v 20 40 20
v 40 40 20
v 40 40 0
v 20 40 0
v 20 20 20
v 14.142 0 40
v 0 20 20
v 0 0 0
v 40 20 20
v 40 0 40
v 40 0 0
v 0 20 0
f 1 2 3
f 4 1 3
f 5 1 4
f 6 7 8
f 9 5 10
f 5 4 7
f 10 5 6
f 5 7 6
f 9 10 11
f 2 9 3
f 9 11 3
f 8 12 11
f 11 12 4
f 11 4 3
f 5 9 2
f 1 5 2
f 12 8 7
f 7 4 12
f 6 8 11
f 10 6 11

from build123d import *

# Parameters (mm, degrees)
SKETCH1_W           = 40
SKETCH1_H           = 40
BOSS_EXTRUDE1_DEPTH = 40
CUT_EXTRUDE1_DEPTH  = 40
CUT_EXTRUDE2_DEPTH  = 40
CUT_EXTRUDE3_DEPTH  = 40
SKETCH5_W           = 20
SKETCH5_H           = 40
BOSS_EXTRUDE2_DEPTH = 20


with BuildPart() as part:
    # Sketch1 → Boss-Extrude1 (new body)
    with BuildSketch(Plane.XY):
        with Locations((20, 20)):
            Rectangle(SKETCH1_W, SKETCH1_H)
    extrude(amount=BOSS_EXTRUDE1_DEPTH)

    # Sketch2 → Cut-Extrude1 (cut)
    with BuildSketch(Plane.XY.offset(40)):
        Polygon((0, 20), (0, 40), (20, 40), align=None)
    extrude(amount=-CUT_EXTRUDE1_DEPTH, mode=Mode.SUBTRACT)

    # Sketch3 → Cut-Extrude2 (cut)
    with BuildSketch(Plane.ZY):
        Polygon((40, 0), (20, 20), (0, 40), (40, 40), align=None)
    extrude(amount=-CUT_EXTRUDE2_DEPTH, mode=Mode.SUBTRACT)

    # Sketch4 → Cut-Extrude3 (cut)
    with BuildSketch(Plane(origin=(0, 20, 20), x_dir=(1, 0, 0), z_dir=(0, 0.707106781, 0.707106781))):
        Polygon((0, 0), (20, -40), (0, -40), align=None)
    extrude(amount=-CUT_EXTRUDE3_DEPTH, mode=Mode.SUBTRACT)

    # Sketch5 → Boss-Extrude2 (add)
    with BuildSketch(Plane(origin=(40, 0, 0), x_dir=(0, 0, -1), z_dir=(1, 0, 0))):
        with Locations((-10, 20)):
            Rectangle(SKETCH5_W, SKETCH5_H)
    extrude(amount=-BOSS_EXTRUDE2_DEPTH)


solid = part.part
